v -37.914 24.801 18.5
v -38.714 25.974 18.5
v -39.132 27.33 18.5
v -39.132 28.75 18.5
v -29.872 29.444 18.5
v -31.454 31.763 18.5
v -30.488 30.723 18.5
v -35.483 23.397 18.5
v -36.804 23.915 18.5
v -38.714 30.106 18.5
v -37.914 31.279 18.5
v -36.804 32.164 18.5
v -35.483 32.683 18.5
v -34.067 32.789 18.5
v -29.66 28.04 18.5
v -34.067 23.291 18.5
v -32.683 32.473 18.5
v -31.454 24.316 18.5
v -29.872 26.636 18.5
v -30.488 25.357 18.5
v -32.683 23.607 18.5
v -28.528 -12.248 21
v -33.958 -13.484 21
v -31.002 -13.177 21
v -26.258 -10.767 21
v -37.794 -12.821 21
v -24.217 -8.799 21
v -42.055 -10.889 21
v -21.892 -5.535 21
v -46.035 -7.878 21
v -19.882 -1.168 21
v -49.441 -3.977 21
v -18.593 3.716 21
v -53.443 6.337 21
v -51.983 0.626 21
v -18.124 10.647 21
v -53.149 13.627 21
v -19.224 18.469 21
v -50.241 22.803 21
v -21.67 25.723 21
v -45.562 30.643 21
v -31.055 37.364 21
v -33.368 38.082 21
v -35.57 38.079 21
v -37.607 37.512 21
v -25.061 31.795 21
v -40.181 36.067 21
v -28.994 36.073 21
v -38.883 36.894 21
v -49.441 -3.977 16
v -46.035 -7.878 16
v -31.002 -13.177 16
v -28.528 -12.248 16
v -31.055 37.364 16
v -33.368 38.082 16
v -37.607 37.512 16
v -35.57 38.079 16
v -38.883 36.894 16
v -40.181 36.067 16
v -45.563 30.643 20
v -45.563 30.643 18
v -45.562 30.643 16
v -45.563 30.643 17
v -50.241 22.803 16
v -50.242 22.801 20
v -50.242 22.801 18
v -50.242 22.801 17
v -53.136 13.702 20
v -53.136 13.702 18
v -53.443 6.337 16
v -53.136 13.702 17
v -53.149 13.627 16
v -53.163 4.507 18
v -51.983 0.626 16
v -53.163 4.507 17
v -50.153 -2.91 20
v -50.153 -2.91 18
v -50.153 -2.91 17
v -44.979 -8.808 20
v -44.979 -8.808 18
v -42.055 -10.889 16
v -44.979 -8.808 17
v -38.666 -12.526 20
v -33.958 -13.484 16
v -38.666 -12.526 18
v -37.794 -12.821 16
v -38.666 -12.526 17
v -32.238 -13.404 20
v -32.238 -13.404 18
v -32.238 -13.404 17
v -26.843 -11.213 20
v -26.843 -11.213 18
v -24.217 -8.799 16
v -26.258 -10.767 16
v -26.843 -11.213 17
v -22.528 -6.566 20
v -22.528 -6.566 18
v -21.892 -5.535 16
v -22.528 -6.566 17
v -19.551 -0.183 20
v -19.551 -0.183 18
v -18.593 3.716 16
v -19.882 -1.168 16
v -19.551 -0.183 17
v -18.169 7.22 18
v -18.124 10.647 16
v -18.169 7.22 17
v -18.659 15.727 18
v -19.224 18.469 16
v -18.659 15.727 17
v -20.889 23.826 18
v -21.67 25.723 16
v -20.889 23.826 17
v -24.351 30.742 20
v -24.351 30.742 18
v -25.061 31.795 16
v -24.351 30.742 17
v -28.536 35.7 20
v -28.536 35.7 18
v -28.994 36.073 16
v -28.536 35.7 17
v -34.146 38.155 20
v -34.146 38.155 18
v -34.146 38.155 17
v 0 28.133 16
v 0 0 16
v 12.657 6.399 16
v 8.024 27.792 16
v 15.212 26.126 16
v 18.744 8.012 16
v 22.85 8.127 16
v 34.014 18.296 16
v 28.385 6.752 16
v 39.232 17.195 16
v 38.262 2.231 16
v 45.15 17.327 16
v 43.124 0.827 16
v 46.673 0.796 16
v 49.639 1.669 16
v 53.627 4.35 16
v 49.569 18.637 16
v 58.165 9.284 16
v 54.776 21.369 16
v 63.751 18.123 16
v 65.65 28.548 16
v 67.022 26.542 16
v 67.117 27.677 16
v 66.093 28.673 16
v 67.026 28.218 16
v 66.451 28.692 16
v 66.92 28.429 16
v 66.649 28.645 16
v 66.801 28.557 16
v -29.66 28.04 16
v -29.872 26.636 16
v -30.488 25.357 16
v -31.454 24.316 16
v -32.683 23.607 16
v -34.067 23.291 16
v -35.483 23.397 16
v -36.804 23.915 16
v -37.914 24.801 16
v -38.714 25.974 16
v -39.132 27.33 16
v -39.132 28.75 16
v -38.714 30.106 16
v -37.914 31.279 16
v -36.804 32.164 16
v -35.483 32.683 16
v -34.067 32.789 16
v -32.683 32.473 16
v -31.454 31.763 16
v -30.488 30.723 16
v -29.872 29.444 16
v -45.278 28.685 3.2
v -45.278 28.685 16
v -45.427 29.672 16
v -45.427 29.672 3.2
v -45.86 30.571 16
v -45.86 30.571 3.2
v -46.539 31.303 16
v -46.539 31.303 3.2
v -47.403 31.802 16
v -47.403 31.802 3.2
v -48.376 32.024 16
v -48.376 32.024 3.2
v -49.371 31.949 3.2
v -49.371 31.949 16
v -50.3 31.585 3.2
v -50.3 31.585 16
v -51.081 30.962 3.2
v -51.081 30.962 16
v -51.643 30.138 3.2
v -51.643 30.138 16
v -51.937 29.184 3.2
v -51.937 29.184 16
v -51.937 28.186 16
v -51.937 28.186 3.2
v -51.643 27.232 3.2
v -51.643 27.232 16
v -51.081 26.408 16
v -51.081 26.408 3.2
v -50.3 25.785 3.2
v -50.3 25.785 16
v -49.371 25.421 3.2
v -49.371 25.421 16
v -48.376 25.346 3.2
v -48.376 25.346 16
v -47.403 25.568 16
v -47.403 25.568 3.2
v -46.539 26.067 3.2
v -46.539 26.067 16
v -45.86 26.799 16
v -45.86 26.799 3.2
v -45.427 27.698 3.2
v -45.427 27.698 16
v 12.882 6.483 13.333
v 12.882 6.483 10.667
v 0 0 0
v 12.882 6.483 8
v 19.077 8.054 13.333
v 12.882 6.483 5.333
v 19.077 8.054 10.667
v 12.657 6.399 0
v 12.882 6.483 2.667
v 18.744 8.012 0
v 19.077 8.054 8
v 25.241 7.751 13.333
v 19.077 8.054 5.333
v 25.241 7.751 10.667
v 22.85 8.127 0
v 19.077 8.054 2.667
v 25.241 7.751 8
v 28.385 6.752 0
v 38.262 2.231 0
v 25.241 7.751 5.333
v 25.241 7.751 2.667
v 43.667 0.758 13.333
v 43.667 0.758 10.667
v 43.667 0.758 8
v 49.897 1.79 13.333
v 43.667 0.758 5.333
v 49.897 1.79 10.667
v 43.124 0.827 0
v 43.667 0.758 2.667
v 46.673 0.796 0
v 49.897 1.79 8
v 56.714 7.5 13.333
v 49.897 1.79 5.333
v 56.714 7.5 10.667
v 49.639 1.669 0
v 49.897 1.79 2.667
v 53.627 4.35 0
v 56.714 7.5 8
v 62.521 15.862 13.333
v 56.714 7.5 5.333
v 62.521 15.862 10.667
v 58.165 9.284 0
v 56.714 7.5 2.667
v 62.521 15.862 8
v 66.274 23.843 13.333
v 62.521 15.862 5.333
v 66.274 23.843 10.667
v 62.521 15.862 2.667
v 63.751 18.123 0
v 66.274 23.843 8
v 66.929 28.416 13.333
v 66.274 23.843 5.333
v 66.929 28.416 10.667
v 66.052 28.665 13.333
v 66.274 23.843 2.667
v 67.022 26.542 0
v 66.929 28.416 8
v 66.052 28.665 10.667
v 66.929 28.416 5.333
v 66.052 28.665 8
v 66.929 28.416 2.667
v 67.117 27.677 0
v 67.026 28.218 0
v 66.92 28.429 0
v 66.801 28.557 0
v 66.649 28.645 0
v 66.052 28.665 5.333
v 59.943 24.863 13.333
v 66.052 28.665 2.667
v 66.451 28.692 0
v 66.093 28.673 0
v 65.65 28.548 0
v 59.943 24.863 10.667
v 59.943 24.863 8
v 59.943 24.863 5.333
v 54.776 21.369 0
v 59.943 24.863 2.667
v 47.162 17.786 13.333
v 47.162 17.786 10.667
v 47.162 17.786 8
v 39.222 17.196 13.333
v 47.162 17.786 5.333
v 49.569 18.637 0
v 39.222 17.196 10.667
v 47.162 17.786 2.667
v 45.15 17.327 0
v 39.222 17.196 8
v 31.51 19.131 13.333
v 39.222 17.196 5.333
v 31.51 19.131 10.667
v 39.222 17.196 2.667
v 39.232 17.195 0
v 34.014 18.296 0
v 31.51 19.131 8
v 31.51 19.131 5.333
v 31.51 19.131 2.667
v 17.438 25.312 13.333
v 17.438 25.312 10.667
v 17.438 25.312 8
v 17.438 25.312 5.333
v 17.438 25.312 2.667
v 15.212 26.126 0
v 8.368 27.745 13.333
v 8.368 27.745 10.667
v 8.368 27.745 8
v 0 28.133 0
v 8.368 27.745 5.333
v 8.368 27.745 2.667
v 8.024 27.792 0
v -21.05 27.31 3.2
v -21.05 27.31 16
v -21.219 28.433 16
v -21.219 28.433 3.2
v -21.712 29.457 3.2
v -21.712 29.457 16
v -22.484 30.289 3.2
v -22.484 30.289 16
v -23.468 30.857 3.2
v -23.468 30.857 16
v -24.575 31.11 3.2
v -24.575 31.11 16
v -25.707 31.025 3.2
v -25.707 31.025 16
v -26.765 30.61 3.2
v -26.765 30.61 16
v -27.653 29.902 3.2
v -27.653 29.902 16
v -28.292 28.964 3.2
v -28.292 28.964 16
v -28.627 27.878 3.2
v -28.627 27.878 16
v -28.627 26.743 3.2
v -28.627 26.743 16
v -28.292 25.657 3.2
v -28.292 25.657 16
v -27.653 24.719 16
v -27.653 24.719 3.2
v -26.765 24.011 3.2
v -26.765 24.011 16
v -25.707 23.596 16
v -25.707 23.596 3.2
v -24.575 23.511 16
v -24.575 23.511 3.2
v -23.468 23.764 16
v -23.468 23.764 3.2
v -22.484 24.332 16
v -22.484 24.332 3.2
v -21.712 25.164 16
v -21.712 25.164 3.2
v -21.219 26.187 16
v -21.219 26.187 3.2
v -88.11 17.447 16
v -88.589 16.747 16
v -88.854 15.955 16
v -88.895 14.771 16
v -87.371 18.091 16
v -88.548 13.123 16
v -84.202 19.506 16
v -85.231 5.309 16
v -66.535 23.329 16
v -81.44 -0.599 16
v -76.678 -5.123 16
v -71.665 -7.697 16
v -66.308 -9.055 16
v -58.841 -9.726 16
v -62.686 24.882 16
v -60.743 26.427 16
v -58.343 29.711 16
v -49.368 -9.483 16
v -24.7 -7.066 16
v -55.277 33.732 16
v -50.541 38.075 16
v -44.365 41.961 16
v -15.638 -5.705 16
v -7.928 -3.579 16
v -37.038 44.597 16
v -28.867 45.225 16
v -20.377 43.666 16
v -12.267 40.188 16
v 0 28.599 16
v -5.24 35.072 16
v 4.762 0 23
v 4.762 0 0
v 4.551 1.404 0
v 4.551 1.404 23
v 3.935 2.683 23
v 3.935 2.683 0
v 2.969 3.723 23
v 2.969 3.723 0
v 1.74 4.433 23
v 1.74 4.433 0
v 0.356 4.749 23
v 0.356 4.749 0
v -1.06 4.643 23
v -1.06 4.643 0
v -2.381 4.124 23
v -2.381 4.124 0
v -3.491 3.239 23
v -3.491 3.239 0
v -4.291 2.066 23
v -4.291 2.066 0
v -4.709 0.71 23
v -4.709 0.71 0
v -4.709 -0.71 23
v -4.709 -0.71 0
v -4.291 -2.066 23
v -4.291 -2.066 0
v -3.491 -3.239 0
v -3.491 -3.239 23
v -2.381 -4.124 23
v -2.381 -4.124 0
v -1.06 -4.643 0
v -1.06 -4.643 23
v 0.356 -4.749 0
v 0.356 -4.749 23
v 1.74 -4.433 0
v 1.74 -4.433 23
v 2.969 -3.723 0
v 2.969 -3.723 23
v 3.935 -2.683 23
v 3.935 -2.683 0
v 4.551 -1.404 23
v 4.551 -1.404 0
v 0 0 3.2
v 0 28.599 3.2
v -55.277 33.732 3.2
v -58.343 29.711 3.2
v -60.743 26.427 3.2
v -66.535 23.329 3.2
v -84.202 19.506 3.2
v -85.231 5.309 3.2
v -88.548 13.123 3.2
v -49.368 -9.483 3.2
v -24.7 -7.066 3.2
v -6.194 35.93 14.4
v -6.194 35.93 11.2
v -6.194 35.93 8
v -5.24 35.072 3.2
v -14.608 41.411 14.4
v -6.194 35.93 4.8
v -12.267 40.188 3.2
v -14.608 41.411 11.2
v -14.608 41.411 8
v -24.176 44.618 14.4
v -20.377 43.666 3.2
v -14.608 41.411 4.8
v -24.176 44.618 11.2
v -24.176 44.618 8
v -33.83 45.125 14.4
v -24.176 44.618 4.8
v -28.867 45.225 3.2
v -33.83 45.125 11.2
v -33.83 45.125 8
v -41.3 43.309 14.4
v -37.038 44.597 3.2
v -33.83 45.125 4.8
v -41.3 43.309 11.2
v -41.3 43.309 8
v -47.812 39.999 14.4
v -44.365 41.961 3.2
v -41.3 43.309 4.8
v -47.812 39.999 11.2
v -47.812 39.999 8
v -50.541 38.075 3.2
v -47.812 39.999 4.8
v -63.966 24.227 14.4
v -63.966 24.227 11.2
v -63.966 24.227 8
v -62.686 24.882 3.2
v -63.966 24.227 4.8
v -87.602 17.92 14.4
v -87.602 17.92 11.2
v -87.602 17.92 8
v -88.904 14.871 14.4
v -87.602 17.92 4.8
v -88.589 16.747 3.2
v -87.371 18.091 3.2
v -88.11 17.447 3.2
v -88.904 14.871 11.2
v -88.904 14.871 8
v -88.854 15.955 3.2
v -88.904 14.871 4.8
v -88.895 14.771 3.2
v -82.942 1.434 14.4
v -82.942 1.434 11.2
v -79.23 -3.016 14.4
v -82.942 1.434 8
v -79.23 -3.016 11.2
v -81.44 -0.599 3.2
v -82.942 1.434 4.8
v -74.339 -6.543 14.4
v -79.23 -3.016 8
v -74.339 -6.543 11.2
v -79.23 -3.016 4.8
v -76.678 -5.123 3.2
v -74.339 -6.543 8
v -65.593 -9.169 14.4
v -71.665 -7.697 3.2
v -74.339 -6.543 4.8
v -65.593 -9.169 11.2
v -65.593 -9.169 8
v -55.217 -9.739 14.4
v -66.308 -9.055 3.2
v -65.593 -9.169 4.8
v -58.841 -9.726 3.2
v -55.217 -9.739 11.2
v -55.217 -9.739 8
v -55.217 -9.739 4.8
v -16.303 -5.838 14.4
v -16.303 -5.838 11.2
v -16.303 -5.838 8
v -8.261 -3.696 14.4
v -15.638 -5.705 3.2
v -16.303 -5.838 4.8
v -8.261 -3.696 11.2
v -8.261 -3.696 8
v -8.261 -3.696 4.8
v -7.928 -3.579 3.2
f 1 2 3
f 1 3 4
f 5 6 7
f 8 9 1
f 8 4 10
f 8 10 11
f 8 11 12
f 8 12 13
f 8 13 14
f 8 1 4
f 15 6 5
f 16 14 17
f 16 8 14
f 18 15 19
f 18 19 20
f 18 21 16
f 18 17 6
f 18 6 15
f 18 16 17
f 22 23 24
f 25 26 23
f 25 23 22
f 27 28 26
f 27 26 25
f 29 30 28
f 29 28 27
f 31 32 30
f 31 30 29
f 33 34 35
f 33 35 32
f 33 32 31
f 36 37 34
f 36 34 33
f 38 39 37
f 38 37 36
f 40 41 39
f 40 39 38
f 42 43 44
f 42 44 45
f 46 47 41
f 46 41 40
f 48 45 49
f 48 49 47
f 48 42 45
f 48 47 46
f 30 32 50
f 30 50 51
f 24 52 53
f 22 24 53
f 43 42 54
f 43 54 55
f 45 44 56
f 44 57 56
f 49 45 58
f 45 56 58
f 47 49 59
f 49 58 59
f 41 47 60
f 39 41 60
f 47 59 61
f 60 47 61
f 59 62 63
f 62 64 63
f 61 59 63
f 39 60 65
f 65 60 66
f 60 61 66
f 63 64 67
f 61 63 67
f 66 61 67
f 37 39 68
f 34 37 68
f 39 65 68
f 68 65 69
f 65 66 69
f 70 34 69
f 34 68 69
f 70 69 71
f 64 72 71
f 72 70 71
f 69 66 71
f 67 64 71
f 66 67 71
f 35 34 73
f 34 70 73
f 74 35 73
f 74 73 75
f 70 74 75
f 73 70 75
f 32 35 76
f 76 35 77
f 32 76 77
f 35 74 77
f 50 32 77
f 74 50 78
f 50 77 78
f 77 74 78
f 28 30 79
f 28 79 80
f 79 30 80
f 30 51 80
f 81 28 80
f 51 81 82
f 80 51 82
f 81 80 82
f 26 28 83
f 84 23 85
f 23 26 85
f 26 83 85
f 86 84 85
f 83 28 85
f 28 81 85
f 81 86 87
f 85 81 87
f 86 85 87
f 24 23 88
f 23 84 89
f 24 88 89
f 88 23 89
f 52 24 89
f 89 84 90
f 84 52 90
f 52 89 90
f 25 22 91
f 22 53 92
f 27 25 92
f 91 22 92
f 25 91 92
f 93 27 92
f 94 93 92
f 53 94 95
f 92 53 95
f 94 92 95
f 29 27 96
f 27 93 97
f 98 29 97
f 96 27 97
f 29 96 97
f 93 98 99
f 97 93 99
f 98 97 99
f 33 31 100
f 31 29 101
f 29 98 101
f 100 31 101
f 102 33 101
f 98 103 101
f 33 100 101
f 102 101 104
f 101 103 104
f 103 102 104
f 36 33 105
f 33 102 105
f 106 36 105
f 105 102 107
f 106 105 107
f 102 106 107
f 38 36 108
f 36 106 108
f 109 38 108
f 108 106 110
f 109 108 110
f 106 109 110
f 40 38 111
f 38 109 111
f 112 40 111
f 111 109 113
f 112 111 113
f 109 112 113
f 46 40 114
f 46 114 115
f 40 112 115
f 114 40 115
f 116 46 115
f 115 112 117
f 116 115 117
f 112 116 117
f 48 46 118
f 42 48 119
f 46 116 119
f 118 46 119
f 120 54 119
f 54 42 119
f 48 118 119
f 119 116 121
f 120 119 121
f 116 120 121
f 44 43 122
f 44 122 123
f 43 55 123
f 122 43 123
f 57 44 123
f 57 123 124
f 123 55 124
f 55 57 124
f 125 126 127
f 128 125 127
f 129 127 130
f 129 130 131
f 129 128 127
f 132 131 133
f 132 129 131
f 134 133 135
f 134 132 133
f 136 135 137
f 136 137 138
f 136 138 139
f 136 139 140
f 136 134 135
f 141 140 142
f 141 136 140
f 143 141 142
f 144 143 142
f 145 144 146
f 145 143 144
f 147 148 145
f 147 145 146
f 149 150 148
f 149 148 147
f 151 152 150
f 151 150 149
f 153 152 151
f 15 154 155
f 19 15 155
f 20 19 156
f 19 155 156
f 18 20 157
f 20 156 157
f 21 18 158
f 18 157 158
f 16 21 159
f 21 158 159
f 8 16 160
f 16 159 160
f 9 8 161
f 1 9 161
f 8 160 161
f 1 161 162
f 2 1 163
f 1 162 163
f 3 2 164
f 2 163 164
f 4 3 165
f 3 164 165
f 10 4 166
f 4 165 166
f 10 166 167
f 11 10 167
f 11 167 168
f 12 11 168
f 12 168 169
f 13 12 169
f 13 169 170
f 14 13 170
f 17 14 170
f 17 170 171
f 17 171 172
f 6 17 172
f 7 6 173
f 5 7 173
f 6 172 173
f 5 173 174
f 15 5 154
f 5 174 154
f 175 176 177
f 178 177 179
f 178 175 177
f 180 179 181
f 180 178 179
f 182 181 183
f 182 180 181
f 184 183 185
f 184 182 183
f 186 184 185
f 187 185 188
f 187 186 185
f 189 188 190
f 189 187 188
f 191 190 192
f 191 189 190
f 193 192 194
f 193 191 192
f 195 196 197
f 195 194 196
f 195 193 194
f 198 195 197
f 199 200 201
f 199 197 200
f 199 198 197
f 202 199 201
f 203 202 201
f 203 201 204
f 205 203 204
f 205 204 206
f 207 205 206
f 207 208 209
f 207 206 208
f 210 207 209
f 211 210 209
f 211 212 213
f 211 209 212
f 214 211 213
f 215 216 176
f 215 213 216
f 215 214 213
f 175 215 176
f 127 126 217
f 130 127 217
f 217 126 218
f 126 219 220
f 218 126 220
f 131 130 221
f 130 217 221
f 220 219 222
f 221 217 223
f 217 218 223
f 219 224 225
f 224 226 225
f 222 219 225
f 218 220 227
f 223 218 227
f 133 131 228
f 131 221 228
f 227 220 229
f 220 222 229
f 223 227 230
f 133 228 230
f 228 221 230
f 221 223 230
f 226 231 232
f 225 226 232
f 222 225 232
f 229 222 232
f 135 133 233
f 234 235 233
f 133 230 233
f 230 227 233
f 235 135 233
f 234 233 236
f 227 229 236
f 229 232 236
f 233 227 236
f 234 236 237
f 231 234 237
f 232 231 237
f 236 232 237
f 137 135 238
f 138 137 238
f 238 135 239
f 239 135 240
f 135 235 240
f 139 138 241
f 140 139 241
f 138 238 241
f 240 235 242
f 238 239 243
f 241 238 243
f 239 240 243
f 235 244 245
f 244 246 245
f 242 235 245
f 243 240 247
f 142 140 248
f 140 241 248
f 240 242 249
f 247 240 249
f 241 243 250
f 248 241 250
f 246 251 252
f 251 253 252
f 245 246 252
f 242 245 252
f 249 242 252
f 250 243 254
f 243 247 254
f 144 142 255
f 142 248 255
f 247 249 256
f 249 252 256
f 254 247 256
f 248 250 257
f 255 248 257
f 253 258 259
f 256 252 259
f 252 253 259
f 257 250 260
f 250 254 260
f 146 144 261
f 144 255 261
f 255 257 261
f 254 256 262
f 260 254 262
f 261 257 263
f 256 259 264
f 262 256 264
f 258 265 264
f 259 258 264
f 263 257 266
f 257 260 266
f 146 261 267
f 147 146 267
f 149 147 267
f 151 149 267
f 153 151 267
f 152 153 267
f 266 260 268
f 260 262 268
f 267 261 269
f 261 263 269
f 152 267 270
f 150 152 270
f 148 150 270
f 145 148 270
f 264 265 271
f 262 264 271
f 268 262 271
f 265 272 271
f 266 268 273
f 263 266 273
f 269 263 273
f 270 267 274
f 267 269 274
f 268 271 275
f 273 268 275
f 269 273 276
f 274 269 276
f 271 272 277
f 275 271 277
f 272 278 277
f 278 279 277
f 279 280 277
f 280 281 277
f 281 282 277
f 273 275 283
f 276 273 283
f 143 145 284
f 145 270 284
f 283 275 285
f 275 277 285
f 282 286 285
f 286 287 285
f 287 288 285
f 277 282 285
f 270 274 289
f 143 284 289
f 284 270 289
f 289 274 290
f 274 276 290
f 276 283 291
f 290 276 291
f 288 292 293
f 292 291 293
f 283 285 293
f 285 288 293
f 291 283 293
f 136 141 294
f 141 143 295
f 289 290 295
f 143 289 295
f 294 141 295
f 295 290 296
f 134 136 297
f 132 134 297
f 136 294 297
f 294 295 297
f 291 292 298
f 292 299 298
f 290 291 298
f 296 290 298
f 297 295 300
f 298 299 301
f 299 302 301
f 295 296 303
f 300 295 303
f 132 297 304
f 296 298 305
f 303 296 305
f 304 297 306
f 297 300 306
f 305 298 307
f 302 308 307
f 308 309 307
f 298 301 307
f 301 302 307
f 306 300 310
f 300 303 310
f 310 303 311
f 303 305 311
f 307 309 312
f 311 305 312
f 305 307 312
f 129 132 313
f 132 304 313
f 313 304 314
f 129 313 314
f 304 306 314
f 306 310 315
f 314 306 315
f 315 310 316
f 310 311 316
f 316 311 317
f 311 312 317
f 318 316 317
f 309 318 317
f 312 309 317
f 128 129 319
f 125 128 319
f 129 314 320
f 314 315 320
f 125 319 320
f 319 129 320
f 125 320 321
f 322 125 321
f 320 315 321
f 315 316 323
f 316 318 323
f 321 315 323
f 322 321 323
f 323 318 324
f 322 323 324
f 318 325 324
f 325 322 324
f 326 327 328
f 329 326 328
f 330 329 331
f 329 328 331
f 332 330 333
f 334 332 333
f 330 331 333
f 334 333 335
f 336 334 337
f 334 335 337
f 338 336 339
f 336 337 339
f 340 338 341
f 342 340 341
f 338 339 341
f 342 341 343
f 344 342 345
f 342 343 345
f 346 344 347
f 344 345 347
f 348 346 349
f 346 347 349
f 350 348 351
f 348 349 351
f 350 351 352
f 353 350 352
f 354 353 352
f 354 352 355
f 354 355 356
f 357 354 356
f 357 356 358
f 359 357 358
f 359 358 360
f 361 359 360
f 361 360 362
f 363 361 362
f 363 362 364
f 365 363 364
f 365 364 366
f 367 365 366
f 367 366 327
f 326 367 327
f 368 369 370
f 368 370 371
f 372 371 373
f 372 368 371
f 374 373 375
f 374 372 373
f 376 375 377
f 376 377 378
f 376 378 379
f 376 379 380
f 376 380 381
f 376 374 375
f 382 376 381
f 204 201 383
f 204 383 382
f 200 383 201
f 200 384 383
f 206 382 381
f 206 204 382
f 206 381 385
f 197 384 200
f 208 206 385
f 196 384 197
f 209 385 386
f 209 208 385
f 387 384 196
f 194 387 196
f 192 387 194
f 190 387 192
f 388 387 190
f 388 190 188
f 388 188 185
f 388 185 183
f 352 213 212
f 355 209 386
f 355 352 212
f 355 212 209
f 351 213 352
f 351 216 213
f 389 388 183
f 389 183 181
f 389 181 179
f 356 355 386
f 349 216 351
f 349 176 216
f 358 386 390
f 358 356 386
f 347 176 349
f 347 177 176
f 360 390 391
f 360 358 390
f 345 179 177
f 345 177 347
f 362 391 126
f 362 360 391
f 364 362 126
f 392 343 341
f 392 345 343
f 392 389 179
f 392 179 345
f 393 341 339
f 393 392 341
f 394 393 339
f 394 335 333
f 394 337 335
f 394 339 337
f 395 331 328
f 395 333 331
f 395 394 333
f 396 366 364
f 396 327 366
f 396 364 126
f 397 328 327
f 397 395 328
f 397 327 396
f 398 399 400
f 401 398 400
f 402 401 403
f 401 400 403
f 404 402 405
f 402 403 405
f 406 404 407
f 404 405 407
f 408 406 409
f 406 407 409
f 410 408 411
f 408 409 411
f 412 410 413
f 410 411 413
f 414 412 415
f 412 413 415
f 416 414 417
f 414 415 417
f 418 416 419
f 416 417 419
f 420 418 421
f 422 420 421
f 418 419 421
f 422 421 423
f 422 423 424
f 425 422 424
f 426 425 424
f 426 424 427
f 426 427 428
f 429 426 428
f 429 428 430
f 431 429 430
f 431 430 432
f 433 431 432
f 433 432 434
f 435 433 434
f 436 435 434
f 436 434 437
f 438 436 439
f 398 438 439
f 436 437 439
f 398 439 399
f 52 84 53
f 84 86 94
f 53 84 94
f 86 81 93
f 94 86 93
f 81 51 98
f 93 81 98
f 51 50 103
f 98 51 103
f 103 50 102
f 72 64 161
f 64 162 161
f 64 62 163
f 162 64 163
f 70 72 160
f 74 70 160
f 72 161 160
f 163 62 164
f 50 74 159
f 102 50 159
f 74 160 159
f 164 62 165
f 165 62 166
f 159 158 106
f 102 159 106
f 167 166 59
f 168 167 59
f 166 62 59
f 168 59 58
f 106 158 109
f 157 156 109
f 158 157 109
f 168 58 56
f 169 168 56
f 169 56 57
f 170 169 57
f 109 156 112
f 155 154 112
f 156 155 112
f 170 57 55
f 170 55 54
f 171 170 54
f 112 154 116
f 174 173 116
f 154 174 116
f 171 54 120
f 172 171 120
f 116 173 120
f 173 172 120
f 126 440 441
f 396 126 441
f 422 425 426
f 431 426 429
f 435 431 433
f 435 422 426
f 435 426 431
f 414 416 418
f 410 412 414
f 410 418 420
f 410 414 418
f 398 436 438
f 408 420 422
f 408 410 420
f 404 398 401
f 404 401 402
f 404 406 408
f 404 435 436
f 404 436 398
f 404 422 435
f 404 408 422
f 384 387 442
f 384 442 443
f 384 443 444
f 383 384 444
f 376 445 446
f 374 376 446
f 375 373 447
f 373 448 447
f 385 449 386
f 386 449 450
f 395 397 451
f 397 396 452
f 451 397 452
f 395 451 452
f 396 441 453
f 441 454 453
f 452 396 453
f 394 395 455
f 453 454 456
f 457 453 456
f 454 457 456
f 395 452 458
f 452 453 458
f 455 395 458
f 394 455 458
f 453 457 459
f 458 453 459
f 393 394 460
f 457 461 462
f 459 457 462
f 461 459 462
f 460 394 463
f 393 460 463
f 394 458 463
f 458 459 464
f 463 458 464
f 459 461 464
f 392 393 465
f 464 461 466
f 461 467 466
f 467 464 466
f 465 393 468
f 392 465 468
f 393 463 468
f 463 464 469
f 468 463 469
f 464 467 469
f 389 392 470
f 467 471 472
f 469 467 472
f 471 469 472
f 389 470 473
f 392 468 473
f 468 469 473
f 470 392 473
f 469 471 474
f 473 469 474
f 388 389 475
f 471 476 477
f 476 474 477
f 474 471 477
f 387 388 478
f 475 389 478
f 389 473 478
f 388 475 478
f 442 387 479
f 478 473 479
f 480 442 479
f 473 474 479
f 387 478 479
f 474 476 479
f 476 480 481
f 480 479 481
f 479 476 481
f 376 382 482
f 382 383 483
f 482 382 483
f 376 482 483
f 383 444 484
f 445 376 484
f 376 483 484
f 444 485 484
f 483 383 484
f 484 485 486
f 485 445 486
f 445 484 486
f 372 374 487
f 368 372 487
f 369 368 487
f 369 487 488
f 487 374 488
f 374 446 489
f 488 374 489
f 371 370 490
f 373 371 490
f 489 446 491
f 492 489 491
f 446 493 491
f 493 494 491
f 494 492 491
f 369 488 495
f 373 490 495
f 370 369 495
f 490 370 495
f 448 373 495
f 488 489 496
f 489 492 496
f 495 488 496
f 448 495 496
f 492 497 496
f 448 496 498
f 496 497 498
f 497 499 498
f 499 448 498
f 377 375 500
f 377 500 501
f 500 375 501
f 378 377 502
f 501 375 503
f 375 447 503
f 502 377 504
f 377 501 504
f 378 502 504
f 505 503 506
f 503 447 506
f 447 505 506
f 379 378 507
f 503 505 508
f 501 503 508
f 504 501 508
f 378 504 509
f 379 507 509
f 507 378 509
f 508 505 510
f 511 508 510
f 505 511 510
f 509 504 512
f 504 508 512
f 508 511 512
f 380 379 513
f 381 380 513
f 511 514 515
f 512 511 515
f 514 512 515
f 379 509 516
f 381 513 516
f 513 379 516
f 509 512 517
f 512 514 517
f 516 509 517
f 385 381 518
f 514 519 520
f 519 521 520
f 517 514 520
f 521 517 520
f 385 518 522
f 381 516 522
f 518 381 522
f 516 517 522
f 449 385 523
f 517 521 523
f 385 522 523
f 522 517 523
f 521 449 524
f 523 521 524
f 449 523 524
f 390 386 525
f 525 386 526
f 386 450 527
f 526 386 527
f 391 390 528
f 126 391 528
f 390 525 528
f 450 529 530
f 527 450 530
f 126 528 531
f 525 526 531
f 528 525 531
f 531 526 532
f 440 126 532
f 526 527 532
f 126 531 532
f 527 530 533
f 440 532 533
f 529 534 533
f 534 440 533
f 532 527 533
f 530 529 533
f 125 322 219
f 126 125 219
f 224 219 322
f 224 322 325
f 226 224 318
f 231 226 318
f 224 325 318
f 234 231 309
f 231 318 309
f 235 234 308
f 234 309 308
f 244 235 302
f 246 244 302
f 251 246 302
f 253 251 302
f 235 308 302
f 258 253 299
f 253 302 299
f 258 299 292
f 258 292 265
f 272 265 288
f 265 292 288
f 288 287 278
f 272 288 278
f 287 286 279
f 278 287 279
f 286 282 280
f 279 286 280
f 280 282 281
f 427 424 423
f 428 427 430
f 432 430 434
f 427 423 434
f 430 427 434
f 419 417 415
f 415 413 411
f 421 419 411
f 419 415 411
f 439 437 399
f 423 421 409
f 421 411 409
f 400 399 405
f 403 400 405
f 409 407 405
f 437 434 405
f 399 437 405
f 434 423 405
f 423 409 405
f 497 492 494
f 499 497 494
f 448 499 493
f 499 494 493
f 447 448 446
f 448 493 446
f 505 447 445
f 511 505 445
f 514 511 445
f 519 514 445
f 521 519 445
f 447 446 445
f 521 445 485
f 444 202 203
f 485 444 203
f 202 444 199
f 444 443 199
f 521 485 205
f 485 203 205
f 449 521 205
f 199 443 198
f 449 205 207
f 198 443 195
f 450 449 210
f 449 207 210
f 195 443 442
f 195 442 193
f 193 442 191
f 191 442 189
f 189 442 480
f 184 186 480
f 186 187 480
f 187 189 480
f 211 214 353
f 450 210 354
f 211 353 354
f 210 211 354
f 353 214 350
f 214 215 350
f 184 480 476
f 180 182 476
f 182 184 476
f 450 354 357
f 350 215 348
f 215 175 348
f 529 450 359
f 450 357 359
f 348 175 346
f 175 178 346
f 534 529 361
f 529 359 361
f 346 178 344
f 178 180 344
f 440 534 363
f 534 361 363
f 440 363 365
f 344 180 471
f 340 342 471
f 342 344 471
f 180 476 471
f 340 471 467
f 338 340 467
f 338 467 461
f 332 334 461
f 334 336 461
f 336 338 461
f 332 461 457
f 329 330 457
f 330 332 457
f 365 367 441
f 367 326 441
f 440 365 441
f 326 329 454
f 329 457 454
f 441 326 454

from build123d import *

# Parameters (mm, degrees)
F1_DEPTH  = 16
F2_R      = 4.1852221239
F3_DEPTH  = 25
F5_DEPTH  = 5
F6_R      = 4.7625
F7_DEPTH  = 2.5
F8_R      = 4.7625
F9_DEPTH  = 23
F10_R     = 4.7625
F11_DEPTH = 25
F12_SCALE = 0.8
F13_SCALE = 0.8
F15_DEPTH = 16


with BuildPart() as f1:
    # F0 (on Top) → F1 (new body)
    with BuildSketch(Plane.XY):
        with BuildLine():
            add(Edge.make_bspline(
                [(0, 35.7491821051), (-7.8787554073, 49.2703223238), (-42.5739645717, 65.4352226946), (-72.888007785, 40.8106264437), (-76.3479065544, 27.4777319468), (-113.9553286254, 25.8139044253), (-109.4676597362, 12.1477101503), (-95.8337539132, -16.9247996265), (-39.297445265, -8.9281318341), (-14.1925693537, -7.8035870001), (0, 0)],
                knots=[0, 0, 0, 0, 0.1570259492, 0.2891687633, 0.3714260973, 0.4979968364, 0.5668311438, 0.6862519806, 0.8498928105, 1, 1, 1, 1], degree=3))
            Line((0, 0), (0, 35.7491821051))
        make_face()
    extrude(amount=F1_DEPTH)

    # F2 (on Top) → F3 (cut)
    with BuildSketch(Plane.XY):
        with Locations((-60.7827566564, 35.8562320471)):
            Circle(F2_R)
    extrude(amount=F3_DEPTH, mode=Mode.SUBTRACT)

    # F10 (on face) → F11 (cut)
    with BuildSketch(Plane.XY.offset(16)):
        with Locations((-31.0744717717, 34.1380164027)):
            Circle(F10_R)
    extrude(amount=-F11_DEPTH, mode=Mode.SUBTRACT)


with BuildPart() as f5:
    # F4 (on face) → F5 (new body)
    with BuildSketch(Plane.XY.offset(16)):
        with BuildLine():
            add(Edge.make_bspline(
                [(-40.1809364557, 36.0670983791), (-47.3441068316, 30.9620838474), (-62.8631682684, 3.1567539514), (-30.32434424, -22.3389161466), (-12.6593458515, 7.3758134615), (-25.9620429962, 38.3322445269), (-35.9955992439, 39.0498847943), (-40.1809364557, 36.0670983791)],
                knots=[0, 0, 0, 0, 0.2336222189, 0.4435086005, 0.643330602, 0.8634979046, 1, 1, 1, 1], degree=3))
        make_face()
    extrude(amount=F5_DEPTH)

    # F6 (on face) → F7 (cut)
    with BuildSketch(Plane(origin=(0, 0, 16), x_dir=(1, 0, 0), z_dir=(0, 0, -1))):
        with Locations((-34.4229824841, -28.0399303883)):
            Circle(F6_R)
    extrude(amount=-F7_DEPTH, mode=Mode.SUBTRACT)


with BuildPart() as f9:
    # F8 (on Top) → F9 (new body)
    with BuildSketch(Plane.XY):
        Circle(F8_R)
    extrude(amount=F9_DEPTH)


with BuildPart() as f12_1:
    # F12: copy of F1
    add(f1.part.scale(F12_SCALE).moved(Location((0, 0, 3.2))))


with BuildPart() as f1_1:
    # F13: moved
    add(f1.part.scale(F13_SCALE).moved(Location((0, 0, 3.2))))


with BuildPart() as f15:
    # F14 (on Top) → F15 (new body)
    with BuildSketch(Plane.XY):
        with BuildLine():
            Line((0, 28.1325038522), (0, 0))
            add(Edge.make_bspline(
                [(0, 0), (8.9397907378, 5.0485939575), (24.9001765769, 14.1732918185), (50.7785960402, -11.3119058084), (76.5024276246, 42.495480332), (45.4802791855, 8.5861515621), (18.0273835318, 27.3705323254), (5.5624095452, 28.2828330526), (0, 28.1325038522)],
                knots=[0, 0, 0, 0, 0.1697280888, 0.336089502, 0.5217895186, 0.6782722353, 0.8611757982, 1, 1, 1, 1], degree=3))
        make_face()
    extrude(amount=F15_DEPTH)


solid = Compound([f5.part, f9.part, f1_1.part, f15.part])
